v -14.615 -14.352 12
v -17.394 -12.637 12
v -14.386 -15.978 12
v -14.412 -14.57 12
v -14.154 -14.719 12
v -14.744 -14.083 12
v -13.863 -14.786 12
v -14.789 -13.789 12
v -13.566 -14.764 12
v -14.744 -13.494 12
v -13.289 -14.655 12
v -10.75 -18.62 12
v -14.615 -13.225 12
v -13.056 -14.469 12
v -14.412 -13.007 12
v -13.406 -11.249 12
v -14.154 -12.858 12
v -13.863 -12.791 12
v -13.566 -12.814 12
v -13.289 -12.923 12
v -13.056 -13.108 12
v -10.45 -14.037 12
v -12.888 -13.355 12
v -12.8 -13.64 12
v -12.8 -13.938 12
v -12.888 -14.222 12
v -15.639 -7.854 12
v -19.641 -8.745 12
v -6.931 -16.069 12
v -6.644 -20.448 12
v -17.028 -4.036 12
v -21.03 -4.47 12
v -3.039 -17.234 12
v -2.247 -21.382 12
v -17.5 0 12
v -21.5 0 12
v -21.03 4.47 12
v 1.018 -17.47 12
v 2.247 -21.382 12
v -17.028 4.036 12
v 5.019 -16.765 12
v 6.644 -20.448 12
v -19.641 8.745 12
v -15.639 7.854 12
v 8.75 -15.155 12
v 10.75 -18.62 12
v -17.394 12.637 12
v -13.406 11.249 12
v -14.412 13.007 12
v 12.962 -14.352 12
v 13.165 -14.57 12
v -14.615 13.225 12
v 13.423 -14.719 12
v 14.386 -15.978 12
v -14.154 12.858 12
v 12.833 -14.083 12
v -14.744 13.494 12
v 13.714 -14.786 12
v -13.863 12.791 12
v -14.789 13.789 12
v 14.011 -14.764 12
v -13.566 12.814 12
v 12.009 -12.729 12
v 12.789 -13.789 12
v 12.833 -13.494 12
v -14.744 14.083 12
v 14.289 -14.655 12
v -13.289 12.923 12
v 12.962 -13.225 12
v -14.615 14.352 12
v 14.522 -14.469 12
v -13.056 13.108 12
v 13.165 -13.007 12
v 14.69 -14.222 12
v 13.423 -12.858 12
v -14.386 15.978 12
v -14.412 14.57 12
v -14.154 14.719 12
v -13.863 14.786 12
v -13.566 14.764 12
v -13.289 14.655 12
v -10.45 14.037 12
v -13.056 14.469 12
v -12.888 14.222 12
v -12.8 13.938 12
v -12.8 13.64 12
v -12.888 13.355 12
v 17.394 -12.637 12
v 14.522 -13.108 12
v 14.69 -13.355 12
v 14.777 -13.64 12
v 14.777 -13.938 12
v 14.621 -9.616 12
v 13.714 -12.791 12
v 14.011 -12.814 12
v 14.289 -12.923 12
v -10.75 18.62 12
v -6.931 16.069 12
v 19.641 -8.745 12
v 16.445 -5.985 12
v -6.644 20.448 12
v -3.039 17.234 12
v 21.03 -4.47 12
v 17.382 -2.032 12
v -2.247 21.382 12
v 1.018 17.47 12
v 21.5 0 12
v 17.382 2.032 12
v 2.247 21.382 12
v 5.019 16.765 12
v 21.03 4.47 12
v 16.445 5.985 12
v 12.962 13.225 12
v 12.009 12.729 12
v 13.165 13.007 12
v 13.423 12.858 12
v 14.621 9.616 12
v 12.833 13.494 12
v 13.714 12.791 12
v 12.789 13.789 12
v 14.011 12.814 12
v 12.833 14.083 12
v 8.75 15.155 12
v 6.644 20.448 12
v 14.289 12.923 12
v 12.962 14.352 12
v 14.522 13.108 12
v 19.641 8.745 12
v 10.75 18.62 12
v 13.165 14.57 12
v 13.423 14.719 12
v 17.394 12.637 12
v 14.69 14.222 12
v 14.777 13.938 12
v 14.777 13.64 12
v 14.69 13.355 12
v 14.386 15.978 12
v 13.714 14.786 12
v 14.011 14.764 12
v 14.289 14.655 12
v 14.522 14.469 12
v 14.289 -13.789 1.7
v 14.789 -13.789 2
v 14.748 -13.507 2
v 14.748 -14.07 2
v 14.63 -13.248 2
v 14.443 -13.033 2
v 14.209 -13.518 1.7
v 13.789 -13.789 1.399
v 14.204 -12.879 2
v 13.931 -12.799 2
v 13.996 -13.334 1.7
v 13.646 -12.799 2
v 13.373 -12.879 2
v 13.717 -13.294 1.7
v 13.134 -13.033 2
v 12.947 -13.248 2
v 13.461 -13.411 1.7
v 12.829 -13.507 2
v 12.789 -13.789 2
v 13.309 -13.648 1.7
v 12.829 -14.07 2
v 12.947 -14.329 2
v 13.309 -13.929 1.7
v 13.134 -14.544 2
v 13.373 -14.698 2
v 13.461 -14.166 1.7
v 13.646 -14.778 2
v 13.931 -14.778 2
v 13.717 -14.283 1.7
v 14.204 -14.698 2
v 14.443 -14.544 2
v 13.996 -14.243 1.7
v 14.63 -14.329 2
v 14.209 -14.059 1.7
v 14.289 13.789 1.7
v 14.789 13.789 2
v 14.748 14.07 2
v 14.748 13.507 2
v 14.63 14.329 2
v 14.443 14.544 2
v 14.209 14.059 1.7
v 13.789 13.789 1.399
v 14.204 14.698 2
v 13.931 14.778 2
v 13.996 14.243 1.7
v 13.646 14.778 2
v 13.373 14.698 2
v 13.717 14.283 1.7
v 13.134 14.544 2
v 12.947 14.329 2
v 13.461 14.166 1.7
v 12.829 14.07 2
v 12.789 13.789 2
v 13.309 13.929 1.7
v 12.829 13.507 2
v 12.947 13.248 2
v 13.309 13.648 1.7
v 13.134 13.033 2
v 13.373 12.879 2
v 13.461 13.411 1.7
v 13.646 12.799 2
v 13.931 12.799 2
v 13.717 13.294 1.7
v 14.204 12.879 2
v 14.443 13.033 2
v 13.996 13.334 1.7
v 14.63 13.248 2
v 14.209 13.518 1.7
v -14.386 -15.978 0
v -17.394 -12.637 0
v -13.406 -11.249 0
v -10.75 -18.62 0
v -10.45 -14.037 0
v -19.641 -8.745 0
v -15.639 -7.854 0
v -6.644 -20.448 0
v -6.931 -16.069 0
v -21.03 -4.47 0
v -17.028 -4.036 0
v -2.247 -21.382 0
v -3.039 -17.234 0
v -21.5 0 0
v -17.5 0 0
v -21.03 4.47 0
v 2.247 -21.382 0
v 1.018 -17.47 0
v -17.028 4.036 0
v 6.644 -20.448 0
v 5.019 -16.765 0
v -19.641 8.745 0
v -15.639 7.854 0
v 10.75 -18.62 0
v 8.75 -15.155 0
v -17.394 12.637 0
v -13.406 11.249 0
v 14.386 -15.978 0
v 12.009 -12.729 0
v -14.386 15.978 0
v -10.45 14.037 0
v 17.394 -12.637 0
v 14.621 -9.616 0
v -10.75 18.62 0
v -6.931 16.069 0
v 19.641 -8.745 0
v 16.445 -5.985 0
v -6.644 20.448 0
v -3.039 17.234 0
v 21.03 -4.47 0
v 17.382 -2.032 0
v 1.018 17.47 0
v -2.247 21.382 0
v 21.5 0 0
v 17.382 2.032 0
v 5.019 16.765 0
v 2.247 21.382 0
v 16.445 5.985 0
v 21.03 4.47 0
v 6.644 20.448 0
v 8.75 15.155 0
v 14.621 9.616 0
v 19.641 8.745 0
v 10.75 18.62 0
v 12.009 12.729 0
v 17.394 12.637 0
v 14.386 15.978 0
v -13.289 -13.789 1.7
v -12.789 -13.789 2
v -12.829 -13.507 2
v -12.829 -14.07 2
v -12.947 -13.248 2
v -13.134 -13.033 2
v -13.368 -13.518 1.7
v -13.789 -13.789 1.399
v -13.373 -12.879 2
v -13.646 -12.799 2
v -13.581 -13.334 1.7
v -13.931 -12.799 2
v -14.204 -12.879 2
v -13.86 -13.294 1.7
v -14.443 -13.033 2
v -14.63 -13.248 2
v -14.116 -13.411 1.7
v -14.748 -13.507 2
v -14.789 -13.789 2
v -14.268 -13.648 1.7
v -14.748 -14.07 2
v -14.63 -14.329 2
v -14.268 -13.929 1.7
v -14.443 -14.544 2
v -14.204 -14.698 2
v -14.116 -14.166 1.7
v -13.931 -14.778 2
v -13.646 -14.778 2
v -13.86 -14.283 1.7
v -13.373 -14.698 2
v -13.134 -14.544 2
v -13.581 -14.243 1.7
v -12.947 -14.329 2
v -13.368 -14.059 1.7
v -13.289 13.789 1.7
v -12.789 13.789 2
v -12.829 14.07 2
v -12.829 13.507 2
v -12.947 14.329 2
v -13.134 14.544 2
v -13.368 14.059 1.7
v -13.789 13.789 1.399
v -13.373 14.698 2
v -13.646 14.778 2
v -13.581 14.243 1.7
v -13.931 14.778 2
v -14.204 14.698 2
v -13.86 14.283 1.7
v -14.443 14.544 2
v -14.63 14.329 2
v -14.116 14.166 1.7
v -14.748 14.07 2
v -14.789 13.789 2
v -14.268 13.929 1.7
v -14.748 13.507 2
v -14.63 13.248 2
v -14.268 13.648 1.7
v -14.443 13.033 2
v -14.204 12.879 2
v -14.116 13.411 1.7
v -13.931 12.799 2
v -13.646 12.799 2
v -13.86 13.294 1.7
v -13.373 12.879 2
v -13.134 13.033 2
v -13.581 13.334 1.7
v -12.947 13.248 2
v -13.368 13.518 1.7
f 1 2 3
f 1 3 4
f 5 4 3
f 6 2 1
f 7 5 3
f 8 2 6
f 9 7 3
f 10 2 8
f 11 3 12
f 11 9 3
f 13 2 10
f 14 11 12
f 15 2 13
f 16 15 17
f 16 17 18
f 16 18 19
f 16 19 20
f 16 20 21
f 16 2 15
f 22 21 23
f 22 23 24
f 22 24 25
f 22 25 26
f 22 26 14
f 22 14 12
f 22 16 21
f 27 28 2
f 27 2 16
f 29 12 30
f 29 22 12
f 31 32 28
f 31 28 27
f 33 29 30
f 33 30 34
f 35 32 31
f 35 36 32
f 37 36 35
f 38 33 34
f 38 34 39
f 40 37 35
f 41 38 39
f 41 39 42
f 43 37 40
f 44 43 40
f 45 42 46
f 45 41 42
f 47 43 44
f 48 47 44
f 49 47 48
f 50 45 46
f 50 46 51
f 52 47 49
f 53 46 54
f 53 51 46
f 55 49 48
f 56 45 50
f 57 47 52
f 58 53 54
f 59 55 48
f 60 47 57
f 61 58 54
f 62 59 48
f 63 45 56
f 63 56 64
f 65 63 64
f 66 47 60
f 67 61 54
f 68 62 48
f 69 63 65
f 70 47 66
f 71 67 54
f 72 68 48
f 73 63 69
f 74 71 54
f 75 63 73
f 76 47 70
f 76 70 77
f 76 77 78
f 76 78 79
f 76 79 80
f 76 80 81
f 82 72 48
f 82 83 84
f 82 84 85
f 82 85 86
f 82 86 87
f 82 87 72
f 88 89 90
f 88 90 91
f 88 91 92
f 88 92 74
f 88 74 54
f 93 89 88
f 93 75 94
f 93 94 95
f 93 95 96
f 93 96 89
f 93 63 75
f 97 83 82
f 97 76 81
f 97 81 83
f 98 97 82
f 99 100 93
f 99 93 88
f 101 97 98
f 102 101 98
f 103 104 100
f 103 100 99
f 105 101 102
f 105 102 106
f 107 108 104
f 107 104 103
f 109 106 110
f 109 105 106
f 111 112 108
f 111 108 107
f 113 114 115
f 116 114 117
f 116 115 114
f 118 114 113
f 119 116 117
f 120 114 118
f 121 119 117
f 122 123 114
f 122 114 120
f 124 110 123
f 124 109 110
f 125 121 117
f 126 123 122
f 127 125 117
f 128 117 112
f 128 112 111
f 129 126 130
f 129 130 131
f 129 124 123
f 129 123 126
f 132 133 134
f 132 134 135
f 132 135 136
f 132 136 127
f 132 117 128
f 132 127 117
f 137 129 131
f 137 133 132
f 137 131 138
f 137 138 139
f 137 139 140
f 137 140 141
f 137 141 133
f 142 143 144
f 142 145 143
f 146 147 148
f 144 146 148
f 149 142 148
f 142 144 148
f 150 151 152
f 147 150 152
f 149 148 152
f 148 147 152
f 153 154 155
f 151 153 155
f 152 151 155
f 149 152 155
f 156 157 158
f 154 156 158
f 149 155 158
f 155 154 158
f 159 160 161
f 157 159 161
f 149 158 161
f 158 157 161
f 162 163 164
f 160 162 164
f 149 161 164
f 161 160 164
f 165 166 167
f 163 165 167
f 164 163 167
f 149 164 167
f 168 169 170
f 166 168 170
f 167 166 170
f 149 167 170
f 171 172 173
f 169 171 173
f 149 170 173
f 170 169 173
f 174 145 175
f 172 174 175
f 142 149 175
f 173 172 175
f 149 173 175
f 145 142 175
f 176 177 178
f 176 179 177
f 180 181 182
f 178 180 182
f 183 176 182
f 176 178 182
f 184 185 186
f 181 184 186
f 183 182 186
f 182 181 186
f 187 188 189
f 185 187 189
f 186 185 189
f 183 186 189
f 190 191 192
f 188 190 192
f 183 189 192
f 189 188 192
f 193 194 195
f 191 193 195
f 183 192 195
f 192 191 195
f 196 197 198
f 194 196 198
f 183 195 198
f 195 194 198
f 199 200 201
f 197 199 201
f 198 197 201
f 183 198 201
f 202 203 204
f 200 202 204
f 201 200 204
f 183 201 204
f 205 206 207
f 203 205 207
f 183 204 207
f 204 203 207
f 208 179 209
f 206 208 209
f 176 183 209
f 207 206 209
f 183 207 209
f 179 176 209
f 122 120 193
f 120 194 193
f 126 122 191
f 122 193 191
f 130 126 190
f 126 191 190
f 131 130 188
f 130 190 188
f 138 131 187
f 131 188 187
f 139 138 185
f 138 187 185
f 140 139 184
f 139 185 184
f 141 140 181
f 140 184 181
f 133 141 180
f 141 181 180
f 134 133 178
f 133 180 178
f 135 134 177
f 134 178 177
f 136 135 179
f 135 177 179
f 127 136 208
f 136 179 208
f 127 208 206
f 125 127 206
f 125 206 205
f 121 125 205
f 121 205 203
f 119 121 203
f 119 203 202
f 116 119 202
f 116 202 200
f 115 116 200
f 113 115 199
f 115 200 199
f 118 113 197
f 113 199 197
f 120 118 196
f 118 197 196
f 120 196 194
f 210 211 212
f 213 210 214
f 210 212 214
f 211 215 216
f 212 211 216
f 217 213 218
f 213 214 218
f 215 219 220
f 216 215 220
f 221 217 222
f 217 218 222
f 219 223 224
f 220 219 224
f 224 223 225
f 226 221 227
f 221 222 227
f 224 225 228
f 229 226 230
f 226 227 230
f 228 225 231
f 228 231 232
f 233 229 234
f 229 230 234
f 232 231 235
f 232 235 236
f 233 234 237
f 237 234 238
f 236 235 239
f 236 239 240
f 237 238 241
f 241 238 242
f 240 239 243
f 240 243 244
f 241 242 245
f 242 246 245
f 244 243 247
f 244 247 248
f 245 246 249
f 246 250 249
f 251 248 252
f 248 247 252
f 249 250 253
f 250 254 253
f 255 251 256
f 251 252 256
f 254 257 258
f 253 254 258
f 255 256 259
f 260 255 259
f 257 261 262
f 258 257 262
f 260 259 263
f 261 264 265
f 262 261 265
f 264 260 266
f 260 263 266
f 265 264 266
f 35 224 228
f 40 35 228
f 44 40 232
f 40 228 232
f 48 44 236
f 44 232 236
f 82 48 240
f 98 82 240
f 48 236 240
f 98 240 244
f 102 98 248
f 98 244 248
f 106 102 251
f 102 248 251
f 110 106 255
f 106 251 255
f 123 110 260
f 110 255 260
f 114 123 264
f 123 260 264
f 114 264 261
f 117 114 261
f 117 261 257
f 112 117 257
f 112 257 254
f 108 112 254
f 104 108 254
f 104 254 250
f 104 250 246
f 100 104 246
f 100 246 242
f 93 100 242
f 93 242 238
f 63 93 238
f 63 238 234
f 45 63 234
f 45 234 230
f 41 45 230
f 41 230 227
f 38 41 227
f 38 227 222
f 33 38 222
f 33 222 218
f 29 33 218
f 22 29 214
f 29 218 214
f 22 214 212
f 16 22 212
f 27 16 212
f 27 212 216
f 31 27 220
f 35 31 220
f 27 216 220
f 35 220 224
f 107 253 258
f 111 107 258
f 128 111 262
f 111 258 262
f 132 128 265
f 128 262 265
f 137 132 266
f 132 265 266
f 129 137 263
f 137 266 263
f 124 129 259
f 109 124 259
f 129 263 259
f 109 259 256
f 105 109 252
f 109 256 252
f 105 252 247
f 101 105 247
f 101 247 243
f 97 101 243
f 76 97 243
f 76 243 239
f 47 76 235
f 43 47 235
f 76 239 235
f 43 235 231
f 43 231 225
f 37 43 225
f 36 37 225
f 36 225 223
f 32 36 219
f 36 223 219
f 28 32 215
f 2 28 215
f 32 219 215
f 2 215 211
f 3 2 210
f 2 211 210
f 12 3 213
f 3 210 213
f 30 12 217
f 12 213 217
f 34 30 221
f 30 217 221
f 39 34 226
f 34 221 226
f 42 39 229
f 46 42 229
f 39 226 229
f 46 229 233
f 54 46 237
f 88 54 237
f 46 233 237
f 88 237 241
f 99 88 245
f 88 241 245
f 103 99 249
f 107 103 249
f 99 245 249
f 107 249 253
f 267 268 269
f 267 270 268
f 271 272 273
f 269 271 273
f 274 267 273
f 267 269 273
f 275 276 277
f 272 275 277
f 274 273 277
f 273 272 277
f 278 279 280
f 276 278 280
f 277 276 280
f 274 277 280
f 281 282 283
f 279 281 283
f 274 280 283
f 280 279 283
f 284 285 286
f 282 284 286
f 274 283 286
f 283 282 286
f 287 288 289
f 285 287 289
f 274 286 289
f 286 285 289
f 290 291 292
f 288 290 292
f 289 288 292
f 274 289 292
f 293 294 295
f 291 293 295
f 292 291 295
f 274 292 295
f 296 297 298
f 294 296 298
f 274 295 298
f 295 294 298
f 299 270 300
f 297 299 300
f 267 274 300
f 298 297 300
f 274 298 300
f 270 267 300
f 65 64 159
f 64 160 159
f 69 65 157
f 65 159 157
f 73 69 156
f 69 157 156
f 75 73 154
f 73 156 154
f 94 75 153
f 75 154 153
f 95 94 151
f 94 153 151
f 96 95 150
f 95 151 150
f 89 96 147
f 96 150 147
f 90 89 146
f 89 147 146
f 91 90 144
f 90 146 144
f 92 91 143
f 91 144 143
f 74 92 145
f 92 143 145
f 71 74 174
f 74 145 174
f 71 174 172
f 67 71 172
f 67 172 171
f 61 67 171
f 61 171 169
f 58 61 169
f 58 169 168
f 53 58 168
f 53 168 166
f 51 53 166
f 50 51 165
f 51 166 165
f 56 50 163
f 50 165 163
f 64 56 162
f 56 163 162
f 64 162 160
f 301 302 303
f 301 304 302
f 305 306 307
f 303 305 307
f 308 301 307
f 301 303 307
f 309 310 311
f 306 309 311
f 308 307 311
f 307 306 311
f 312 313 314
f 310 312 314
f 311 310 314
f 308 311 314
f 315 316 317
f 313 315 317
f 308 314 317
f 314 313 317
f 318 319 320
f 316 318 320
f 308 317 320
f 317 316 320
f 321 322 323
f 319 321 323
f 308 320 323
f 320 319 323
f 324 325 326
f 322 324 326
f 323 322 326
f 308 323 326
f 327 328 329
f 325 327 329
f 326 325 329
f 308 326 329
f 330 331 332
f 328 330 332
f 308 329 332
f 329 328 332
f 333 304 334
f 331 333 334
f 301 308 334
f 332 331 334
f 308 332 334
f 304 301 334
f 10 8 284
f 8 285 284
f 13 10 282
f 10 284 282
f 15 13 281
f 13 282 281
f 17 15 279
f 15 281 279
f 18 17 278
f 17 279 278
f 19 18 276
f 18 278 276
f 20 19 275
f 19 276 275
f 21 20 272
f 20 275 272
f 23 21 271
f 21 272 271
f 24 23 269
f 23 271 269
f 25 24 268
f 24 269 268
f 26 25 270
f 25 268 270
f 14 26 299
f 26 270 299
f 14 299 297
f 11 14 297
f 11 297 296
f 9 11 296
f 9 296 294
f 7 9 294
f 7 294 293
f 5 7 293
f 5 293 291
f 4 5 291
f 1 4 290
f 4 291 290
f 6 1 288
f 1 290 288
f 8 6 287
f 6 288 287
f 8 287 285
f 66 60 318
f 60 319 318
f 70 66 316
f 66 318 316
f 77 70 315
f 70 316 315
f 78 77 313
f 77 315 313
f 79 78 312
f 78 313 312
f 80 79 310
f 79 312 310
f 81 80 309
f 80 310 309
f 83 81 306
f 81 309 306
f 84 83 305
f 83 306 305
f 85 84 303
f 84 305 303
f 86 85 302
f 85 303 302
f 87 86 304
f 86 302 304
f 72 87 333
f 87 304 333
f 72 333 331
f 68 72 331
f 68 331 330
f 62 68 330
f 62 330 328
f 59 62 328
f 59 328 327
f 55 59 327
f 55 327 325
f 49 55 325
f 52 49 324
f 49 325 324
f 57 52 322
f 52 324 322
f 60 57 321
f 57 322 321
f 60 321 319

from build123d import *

# Parameters (mm, degrees)
F0_R     = 21.5
F1_DEPTH = 12
F3_D     = 35
F5_D     = 2
F5_DEPTH = 10
F5_TIP   = 0.600860619


with BuildPart() as f1:
    # F0 (on Top) → F1 (new body)
    with BuildSketch(Plane.XY):
        Circle(F0_R)
    extrude(amount=F1_DEPTH)

    # F3 (through all)
    with Locations(Plane.XY.offset(12)):
        with Locations((0, 0)):
            Hole(F3_D / 2)

    # F5
    with Locations(Plane.XY.offset(12)):
        with Locations((-13.7885822331, 13.7885822331), (13.7885822331, 13.7885822331), (13.7885822331, -13.7885822331), (-13.7885822331, -13.7885822331)):
            Hole(F5_D / 2, depth=F5_DEPTH)
            with Locations((0, 0, -(F5_DEPTH + F5_TIP / 2))):  # 118° drill point
                Cone(0, F5_D / 2, F5_TIP, mode=Mode.SUBTRACT)


solid = f1.part
